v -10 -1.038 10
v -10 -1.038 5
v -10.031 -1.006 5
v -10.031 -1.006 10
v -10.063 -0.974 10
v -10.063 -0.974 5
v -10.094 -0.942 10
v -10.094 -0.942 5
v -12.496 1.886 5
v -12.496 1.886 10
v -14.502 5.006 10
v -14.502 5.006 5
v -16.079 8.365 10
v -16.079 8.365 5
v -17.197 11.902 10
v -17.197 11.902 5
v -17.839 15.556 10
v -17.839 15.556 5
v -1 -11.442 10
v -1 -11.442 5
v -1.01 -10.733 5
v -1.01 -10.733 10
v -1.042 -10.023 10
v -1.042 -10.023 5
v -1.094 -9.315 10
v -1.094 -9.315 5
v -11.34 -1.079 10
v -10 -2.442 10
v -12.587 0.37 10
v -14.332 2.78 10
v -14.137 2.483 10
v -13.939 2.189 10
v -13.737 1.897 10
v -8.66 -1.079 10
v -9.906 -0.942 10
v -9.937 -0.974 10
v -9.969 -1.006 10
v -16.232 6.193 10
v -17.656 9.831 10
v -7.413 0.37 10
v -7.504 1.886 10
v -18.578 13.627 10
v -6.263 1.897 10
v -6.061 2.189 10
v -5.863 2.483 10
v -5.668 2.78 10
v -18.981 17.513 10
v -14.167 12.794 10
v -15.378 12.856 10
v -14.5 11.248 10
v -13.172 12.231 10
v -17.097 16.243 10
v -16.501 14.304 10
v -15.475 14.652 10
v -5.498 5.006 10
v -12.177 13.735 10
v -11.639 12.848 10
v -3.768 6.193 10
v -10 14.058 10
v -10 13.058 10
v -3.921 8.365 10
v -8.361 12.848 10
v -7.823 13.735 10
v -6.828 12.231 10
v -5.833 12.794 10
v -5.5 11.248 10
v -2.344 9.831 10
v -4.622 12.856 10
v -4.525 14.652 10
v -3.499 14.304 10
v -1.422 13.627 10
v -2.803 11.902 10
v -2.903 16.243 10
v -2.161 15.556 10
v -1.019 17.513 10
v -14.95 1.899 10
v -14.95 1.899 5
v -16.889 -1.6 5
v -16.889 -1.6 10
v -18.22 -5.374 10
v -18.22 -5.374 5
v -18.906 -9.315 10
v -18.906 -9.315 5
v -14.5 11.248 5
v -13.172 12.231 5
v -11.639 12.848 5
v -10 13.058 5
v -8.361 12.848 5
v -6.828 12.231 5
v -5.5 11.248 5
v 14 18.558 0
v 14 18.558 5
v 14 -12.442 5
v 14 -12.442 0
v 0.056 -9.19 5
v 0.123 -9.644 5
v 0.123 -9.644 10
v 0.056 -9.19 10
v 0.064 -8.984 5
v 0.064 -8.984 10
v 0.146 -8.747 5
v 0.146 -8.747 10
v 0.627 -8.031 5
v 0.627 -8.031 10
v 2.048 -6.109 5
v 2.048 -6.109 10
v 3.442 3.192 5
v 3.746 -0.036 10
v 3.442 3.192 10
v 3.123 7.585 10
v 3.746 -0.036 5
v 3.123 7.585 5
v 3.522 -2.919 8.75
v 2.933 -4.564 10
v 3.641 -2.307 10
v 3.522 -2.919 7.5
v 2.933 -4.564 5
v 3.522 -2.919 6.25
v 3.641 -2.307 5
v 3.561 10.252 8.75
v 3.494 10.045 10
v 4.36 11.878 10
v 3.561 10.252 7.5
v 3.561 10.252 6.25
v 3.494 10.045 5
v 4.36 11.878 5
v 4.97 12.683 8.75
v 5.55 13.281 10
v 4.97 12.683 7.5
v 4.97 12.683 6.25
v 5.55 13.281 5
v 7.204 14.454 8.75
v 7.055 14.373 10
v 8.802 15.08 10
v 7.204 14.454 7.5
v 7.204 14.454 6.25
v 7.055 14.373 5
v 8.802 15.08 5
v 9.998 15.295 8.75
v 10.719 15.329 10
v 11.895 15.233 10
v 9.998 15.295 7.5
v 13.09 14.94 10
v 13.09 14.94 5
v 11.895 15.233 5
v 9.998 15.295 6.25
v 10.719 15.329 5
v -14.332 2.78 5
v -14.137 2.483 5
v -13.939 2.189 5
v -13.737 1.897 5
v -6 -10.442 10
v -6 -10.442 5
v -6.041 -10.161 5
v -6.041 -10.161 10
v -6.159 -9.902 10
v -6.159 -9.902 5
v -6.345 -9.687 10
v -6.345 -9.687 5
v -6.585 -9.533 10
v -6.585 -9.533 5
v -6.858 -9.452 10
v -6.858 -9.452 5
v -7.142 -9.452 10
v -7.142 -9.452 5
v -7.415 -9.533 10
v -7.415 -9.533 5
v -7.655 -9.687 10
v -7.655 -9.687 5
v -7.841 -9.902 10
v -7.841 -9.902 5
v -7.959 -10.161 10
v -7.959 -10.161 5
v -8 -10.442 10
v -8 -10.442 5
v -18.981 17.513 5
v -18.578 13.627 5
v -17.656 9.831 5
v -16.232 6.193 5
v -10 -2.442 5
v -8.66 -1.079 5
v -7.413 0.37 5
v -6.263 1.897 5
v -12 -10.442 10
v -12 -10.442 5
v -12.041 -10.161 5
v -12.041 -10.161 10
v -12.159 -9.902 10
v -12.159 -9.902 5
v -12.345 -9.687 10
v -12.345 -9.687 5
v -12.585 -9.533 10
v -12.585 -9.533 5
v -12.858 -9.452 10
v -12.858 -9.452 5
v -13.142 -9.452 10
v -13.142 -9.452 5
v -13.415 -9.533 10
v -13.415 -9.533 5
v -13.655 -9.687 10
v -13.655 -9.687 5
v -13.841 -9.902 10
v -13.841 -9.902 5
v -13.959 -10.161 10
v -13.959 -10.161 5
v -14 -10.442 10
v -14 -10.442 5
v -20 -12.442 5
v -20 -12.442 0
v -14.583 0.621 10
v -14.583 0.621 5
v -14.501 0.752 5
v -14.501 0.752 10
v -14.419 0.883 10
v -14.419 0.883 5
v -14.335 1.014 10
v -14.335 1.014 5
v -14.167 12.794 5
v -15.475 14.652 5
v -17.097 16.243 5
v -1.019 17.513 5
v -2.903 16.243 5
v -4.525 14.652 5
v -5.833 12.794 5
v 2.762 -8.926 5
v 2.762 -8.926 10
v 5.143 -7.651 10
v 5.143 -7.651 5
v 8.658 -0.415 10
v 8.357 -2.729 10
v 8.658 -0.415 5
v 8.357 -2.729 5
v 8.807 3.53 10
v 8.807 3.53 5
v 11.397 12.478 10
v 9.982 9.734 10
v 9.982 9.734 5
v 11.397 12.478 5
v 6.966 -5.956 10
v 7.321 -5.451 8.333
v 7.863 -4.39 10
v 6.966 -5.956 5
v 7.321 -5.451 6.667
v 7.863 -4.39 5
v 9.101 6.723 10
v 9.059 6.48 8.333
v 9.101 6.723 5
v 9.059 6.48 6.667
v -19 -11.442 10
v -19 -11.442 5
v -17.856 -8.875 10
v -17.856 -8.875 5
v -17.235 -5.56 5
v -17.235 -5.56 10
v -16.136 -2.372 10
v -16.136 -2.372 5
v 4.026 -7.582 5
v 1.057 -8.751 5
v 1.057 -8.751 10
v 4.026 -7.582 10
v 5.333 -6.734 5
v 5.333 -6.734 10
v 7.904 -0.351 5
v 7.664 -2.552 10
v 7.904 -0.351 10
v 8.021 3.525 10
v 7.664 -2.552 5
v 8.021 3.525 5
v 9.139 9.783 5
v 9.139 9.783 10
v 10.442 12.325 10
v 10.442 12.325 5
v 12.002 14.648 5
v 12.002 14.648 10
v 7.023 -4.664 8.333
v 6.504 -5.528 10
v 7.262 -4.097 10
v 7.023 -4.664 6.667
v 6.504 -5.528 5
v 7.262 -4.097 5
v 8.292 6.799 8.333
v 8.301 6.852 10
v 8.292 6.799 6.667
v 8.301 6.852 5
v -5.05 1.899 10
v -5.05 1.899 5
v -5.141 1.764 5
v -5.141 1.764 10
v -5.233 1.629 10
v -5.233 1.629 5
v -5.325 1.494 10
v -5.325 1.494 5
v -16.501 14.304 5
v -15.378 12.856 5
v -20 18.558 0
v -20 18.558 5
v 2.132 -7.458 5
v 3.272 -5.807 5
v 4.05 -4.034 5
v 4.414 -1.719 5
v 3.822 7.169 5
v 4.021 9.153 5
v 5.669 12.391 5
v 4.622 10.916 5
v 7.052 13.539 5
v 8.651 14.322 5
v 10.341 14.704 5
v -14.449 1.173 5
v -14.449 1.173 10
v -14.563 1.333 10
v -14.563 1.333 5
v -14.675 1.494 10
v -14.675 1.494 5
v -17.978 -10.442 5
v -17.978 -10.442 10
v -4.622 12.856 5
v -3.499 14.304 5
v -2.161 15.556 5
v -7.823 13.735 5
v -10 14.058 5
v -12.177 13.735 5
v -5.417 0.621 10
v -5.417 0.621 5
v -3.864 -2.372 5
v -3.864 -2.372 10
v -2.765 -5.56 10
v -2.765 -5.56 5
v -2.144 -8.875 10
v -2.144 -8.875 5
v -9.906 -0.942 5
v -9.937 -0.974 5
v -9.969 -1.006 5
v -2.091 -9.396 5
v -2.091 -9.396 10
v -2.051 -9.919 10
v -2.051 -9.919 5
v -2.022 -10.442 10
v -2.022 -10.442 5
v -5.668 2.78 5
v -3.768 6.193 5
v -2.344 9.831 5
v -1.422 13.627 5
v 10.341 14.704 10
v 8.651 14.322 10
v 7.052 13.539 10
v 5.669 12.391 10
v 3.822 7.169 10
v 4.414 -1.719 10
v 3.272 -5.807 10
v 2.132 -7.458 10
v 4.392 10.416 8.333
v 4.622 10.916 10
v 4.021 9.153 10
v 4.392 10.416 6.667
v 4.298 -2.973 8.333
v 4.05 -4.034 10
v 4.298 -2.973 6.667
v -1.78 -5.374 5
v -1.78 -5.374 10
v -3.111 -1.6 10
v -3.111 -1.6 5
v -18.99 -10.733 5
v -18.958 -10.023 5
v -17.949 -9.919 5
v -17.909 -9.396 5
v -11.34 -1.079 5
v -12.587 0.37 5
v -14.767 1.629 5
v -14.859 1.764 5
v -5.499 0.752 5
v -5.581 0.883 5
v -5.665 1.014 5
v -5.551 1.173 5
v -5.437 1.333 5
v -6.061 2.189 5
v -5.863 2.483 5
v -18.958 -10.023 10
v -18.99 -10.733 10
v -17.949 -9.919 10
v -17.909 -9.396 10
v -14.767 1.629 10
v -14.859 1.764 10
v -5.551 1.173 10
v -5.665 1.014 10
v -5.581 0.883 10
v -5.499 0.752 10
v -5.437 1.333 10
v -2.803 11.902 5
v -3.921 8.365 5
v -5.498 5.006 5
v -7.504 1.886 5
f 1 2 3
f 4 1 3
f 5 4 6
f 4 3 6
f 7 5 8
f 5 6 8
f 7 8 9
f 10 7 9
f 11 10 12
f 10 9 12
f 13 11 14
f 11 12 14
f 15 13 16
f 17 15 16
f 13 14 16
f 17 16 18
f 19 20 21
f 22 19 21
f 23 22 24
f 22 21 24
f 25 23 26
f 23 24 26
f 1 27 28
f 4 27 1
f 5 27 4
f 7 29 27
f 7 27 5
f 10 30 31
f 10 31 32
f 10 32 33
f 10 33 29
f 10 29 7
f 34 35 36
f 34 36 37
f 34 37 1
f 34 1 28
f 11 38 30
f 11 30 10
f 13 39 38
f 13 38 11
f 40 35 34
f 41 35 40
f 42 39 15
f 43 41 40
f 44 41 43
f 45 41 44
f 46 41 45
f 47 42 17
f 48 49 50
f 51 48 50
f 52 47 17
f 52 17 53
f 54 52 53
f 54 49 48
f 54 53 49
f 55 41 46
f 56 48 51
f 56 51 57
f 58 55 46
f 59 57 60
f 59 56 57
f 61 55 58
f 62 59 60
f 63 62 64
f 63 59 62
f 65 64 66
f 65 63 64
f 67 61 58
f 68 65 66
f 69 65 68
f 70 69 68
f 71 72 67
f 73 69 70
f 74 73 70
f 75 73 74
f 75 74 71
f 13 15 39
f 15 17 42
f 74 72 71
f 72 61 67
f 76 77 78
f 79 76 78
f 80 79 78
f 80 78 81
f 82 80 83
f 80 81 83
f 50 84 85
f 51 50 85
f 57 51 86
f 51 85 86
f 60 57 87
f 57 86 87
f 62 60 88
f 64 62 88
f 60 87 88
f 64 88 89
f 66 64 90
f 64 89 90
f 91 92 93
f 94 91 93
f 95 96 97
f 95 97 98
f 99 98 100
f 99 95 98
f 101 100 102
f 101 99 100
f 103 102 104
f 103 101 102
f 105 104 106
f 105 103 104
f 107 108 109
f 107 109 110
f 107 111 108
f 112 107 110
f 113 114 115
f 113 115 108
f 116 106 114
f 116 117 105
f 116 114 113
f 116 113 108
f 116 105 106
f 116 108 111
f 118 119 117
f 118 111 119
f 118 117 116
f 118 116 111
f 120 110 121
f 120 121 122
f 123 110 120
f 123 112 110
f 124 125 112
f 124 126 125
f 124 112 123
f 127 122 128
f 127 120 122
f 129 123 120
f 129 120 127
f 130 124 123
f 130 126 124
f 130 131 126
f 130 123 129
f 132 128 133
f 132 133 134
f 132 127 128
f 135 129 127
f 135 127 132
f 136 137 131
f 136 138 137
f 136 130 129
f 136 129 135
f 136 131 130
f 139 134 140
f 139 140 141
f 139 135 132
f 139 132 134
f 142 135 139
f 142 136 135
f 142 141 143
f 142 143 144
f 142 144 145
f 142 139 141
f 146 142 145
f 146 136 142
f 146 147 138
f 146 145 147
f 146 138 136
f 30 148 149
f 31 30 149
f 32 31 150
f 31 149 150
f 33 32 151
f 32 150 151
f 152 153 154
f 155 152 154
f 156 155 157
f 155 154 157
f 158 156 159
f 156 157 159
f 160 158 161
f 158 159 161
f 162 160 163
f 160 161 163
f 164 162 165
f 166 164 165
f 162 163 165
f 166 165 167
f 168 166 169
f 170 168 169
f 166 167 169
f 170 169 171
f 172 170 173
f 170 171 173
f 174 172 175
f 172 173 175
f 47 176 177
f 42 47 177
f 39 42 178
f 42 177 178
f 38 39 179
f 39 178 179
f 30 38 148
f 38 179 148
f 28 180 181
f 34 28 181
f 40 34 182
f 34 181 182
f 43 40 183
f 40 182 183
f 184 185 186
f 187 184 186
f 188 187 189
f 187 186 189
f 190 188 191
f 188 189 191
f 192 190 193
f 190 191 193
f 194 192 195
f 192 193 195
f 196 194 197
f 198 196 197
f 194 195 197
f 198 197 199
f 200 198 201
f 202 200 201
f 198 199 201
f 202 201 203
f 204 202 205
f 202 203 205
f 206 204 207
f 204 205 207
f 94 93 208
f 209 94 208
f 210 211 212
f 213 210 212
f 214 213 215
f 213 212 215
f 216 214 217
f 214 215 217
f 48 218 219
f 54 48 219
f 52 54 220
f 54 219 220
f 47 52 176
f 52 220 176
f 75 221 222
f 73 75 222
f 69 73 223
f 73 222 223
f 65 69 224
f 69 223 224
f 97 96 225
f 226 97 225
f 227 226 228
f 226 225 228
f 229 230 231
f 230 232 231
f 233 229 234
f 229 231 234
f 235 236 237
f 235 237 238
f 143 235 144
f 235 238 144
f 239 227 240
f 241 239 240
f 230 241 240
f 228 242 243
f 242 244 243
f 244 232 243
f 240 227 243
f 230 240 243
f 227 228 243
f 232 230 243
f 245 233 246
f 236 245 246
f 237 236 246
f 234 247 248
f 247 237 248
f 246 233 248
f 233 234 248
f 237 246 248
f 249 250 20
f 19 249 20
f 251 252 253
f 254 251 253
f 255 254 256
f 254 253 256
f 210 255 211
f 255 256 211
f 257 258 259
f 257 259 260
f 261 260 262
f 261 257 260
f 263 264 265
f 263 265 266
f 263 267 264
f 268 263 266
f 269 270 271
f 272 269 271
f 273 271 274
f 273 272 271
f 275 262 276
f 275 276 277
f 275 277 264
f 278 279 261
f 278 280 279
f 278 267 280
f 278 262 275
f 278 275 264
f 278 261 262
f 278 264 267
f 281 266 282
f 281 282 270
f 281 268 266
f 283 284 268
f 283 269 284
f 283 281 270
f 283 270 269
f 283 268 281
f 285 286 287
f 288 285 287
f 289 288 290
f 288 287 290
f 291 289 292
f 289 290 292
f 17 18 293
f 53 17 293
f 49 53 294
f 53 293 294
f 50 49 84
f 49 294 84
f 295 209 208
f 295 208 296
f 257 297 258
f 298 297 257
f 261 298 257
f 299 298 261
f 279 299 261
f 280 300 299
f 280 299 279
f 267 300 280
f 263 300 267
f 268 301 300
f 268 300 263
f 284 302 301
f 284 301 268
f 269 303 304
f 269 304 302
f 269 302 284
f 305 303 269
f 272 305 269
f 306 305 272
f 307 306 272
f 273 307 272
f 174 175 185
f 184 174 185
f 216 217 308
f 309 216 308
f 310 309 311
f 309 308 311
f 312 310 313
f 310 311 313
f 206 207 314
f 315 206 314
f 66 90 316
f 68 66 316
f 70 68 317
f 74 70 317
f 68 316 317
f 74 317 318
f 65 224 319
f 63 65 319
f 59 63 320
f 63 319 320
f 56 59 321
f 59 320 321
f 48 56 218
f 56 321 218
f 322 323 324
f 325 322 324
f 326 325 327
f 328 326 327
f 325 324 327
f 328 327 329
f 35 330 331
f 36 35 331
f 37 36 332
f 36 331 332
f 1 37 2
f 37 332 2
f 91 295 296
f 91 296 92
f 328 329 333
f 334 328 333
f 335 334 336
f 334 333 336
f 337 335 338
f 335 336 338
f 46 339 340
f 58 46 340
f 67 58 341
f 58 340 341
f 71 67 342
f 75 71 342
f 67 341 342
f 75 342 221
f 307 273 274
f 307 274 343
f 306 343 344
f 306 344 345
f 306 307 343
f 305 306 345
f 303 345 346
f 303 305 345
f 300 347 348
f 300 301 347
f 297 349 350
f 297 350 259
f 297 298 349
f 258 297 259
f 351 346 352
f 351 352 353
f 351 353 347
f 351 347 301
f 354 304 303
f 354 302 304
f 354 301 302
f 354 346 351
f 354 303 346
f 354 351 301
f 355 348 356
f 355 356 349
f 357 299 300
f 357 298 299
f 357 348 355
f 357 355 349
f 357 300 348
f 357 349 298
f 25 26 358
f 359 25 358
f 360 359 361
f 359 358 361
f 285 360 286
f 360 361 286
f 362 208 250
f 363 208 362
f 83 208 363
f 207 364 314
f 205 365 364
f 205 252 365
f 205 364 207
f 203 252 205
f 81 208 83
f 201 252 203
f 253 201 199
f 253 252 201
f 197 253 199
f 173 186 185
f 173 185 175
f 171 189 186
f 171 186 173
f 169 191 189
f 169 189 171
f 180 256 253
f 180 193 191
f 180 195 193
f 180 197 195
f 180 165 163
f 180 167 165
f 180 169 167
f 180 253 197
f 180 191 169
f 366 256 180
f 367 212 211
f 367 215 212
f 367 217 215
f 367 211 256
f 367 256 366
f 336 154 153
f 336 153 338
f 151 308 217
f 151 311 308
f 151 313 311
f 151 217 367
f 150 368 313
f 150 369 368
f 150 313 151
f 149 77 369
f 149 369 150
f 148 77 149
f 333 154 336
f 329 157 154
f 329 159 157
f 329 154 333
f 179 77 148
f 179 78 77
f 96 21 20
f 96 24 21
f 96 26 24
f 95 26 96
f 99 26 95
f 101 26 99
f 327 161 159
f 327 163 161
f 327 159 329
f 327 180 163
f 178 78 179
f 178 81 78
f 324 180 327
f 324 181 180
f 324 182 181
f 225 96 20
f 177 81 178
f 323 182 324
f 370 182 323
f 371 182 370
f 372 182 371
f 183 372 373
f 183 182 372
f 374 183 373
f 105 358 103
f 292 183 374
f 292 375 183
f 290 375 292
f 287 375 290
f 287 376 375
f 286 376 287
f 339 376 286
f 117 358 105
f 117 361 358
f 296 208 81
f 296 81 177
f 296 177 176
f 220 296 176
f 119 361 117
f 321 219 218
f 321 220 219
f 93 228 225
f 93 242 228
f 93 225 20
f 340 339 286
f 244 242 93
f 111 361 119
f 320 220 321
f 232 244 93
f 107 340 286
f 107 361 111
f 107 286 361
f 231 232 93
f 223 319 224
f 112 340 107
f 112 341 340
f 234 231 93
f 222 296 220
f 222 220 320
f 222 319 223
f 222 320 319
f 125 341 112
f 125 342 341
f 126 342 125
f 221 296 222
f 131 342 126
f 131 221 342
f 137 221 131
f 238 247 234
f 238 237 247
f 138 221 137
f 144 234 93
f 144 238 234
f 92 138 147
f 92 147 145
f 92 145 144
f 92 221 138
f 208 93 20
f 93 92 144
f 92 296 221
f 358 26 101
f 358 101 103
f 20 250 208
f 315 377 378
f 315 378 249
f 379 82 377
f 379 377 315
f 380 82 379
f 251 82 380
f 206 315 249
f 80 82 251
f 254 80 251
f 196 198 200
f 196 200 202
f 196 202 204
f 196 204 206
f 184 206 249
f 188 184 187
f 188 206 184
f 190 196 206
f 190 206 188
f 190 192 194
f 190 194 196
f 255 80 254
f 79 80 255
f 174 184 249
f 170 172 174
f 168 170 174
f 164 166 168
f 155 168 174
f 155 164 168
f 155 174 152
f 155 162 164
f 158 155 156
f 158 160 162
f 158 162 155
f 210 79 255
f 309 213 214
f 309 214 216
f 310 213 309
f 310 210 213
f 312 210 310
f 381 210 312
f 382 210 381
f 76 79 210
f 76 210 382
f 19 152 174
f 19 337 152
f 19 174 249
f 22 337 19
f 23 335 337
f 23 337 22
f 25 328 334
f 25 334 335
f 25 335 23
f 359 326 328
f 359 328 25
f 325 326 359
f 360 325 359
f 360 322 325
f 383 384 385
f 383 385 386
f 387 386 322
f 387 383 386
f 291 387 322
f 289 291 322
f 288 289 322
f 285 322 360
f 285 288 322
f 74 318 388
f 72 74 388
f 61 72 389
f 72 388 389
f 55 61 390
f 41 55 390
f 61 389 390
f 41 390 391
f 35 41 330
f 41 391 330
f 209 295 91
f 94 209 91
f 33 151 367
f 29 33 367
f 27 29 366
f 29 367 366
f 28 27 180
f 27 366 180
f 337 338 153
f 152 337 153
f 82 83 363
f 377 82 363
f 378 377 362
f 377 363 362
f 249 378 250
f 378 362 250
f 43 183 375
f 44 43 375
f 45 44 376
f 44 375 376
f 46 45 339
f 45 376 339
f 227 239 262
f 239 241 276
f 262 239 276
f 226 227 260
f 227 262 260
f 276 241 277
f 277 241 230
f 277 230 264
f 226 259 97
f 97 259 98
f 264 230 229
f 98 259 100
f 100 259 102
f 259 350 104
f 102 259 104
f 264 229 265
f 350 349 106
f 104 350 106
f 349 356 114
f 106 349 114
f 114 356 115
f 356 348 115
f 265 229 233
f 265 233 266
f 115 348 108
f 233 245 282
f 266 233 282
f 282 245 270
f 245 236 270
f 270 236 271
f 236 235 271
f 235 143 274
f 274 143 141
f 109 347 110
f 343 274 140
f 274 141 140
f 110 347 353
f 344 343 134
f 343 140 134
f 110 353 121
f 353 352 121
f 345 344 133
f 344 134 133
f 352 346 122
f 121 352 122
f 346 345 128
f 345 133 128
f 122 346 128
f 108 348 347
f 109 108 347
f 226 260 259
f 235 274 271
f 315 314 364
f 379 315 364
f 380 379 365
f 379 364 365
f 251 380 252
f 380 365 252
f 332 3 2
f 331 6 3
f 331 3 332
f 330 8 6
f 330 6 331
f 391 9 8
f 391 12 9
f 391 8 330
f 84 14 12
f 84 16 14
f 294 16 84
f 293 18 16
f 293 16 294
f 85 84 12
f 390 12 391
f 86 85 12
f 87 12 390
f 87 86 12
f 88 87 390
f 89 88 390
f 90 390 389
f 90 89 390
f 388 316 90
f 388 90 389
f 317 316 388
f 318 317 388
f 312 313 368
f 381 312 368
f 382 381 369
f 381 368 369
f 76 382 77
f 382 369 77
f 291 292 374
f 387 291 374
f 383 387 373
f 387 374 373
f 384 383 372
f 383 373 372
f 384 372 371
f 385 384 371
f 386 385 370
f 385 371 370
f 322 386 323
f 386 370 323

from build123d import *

# Parameters (mm, degrees)
F0_W     = 40
F0_H     = 40
F1_DEPTH = 5
F3_DEPTH = 5
F5_DEPTH = 5
F7_DEPTH = 5


with BuildPart() as f1:
    # F0 (on Top) → F1 (new body)
    with BuildSketch(Plane.XY):
        with Locations((0, -1.4423078379)):
            Rectangle(F0_W, F0_H)
    extrude(amount=F1_DEPTH)

    # F2 (on face) → F3 (join)
    with BuildSketch(Plane.XY.offset(5)):
        with BuildLine():
            ThreePointArc((-14.1666666667, 12.7937878067), (-16.2497421132, 15.4842249108), (-18.9811853554, 17.5132327819))
            ThreePointArc((-18.9811853554, 17.5132327819), (-17.6558893012, 9.8311930383), (-14.3321956463, 2.7797247698))
            ThreePointArc((-14.3321956463, 2.7797247698), (-14.0384410091, 2.335690009), (-13.7365842266, 1.8971228665))
            ThreePointArc((-13.7365842266, 1.8971228665), (-11.9756652837, -0.3650490595), (-10, -2.4423078379))
            ThreePointArc((-10, -2.4423078379), (-8.0243347163, -0.3650490595), (-6.2634157734, 1.8971228665))
            ThreePointArc((-6.2634157734, 1.8971228665), (-5.9615589909, 2.335690009), (-5.6678043537, 2.7797247698))
            ThreePointArc((-5.6678043537, 2.7797247698), (-2.3441106988, 9.8311930383), (-1.0188146446, 17.5132327819))
            ThreePointArc((-1.0188146446, 17.5132327819), (-3.7502578868, 15.4842249108), (-5.8333333333, 12.7937878067))
            ThreePointArc((-5.8333333333, 12.7937878067), (-10, 14.0576921621), (-14.1666666667, 12.7937878067))
        make_face()
        with BuildLine():
            ThreePointArc((-17.8386090668, 15.5557186069), (-15.9104422617, 13.6025441919), (-14.5, 11.2481079219))
            ThreePointArc((-14.5, 11.2481079219), (-10, 13.0576921621), (-5.5, 11.2481079219))
            ThreePointArc((-5.5, 11.2481079219), (-4.0895577383, 13.6025441919), (-2.1613909332, 15.5557186069))
            ThreePointArc((-2.1613909332, 15.5557186069), (-4.6538444684, 6.6592721087), (-9.9058957618, -0.9417174409))
            ThreePointArc((-9.9058957618, -0.9417174409), (-9.952889806, -0.9900282388), (-10, -1.0382257802))
            ThreePointArc((-10, -1.0382257802), (-10.047110194, -0.9900282388), (-10.0941042382, -0.9417174409))
            ThreePointArc((-10.0941042382, -0.9417174409), (-15.3461555316, 6.6592721087), (-17.8386090668, 15.5557186069))
        make_face(mode=Mode.SUBTRACT)
        with BuildLine():
            ThreePointArc((-14.6746917604, 1.49429313), (-14.813143454, 1.6962594848), (-14.9499420607, 1.8993491722))
            ThreePointArc((-14.9499420607, 1.8993491722), (-17.6333766655, -3.4591843441), (-18.9055769047, -9.3154808935))
            ThreePointArc((-18.9055769047, -9.3154808935), (-18.9763826057, -10.3778468743), (-19, -11.4423078379))
            Line((-19, -11.4423078379), (-18, -11.4423078379))
            Line((-18, -11.4423078379), (-2, -11.4423078379))
            Line((-2, -11.4423078379), (-1, -11.4423078379))
            ThreePointArc((-1, -11.4423078379), (-1.0236173943, -10.3778468743), (-1.0944230953, -9.3154808935))
            ThreePointArc((-1.0944230953, -9.3154808935), (-2.3666233345, -3.4591843441), (-5.0500579393, 1.8993491722))
            ThreePointArc((-5.0500579393, 1.8993491722), (-5.186856546, 1.6962594848), (-5.3253082396, 1.49429313))
            ThreePointArc((-5.3253082396, 1.49429313), (-5.4938586481, 1.2530963551), (-5.664766687, 1.0135643809))
            ThreePointArc((-5.664766687, 1.0135643809), (-5.5400096968, 0.8177401798), (-5.4172359122, 0.6206665334))
            ThreePointArc((-5.4172359122, 0.6206665334), (-3.2558828795, -3.9460840787), (-2.1437824802, -8.8745616111))
            ThreePointArc((-2.1437824802, -8.8745616111), (-2.0693638619, -9.6573915088), (-2.0217494138, -10.4423078379))
            Line((-2.0217494138, -10.4423078379), (-6, -10.4423078379))
            ThreePointArc((-6, -10.4423078379), (-7, -9.4423078379), (-8, -10.4423078379))
            Line((-8, -10.4423078379), (-12, -10.4423078379))
            ThreePointArc((-12, -10.4423078379), (-13, -9.4423078379), (-14, -10.4423078379))
            Line((-14, -10.4423078379), (-17.9782505862, -10.4423078379))
            ThreePointArc((-17.9782505862, -10.4423078379), (-17.9306361381, -9.6573915088), (-17.8562175198, -8.8745616111))
            ThreePointArc((-17.8562175198, -8.8745616111), (-16.7441171205, -3.9460840787), (-14.5827640878, 0.6206665334))
            ThreePointArc((-14.5827640878, 0.6206665334), (-14.4599903032, 0.8177401798), (-14.335233313, 1.0135643809))
            ThreePointArc((-14.335233313, 1.0135643809), (-14.5061413519, 1.2530963551), (-14.6746917604, 1.49429313))
        make_face()
    extrude(amount=F3_DEPTH)

    # F4 (on face) → F5 (join)
    with BuildSketch(Plane.XY.offset(5)):
        with BuildLine():
            add(Edge.make_bspline(
                [(0.122830745, -9.643862473), (0.0800776075, -9.2564371629), (-0.2836475293, -8.6528840078), (6.0697106921, -2.7539463587), (0.1924889118, 11.010617472), (8.8871559228, 16.3315651176), (13.0897243609, 14.9395701919)],
                knots=[0, 0, 0, 0, 0.0892731935, 0.3389697324, 0.6872592966, 1, 1, 1, 1], degree=3))
            add(Edge.make_bspline(
                [(0.122830745, -9.643862473), (2.0720909999, -9.4130289317), (10.0156728008, -6.4074475552), (7.6737975893, 6.9160370202), (11.3169839092, 12.5534842645), (13.0897243609, 14.9395701919)],
                knots=[0, 0, 0, 0, 0.3064110943, 0.6750197333, 1, 1, 1, 1], degree=3))
        make_face()
        with BuildLine():
            add(Edge.make_bspline(
                [(1.0569917504, -8.7510244921), (3.4597109512, -8.0260629747), (9.0131155024, -5.6121363011), (7.0344823054, 7.3072493213), (10.3734166024, 12.3634970165), (12.0017683264, 14.648278338)],
                knots=[0, 0, 0, 0, 0.2977508402, 0.6737539057, 1, 1, 1, 1], degree=3))
            add(Edge.make_bspline(
                [(12.0017683264, 14.648278338), (9.1677881113, 15.1552440171), (1.2156290574, 11.3124895915), (6.3737009511, -3.1480270391), (2.0842432148, -7.4958972715), (1.0569917504, -8.7510244921)],
                knots=[0, 0, 0, 0, 0.3213012994, 0.7197281403, 1, 1, 1, 1], degree=3))
        make_face(mode=Mode.SUBTRACT)
    extrude(amount=F5_DEPTH)

    # F6 (on face) → F7 (cut, through all)
    with BuildSketch(Plane.XY.offset(5)):
        Polygon((-20, -21.4423078379), (20, -21.4423078379), (20, 18.5576921621), (14, 18.5576921621), (14, -12.4423078379), (-20, -12.4423078379), align=None)
    extrude(amount=-F7_DEPTH, mode=Mode.SUBTRACT)


solid = f1.part
